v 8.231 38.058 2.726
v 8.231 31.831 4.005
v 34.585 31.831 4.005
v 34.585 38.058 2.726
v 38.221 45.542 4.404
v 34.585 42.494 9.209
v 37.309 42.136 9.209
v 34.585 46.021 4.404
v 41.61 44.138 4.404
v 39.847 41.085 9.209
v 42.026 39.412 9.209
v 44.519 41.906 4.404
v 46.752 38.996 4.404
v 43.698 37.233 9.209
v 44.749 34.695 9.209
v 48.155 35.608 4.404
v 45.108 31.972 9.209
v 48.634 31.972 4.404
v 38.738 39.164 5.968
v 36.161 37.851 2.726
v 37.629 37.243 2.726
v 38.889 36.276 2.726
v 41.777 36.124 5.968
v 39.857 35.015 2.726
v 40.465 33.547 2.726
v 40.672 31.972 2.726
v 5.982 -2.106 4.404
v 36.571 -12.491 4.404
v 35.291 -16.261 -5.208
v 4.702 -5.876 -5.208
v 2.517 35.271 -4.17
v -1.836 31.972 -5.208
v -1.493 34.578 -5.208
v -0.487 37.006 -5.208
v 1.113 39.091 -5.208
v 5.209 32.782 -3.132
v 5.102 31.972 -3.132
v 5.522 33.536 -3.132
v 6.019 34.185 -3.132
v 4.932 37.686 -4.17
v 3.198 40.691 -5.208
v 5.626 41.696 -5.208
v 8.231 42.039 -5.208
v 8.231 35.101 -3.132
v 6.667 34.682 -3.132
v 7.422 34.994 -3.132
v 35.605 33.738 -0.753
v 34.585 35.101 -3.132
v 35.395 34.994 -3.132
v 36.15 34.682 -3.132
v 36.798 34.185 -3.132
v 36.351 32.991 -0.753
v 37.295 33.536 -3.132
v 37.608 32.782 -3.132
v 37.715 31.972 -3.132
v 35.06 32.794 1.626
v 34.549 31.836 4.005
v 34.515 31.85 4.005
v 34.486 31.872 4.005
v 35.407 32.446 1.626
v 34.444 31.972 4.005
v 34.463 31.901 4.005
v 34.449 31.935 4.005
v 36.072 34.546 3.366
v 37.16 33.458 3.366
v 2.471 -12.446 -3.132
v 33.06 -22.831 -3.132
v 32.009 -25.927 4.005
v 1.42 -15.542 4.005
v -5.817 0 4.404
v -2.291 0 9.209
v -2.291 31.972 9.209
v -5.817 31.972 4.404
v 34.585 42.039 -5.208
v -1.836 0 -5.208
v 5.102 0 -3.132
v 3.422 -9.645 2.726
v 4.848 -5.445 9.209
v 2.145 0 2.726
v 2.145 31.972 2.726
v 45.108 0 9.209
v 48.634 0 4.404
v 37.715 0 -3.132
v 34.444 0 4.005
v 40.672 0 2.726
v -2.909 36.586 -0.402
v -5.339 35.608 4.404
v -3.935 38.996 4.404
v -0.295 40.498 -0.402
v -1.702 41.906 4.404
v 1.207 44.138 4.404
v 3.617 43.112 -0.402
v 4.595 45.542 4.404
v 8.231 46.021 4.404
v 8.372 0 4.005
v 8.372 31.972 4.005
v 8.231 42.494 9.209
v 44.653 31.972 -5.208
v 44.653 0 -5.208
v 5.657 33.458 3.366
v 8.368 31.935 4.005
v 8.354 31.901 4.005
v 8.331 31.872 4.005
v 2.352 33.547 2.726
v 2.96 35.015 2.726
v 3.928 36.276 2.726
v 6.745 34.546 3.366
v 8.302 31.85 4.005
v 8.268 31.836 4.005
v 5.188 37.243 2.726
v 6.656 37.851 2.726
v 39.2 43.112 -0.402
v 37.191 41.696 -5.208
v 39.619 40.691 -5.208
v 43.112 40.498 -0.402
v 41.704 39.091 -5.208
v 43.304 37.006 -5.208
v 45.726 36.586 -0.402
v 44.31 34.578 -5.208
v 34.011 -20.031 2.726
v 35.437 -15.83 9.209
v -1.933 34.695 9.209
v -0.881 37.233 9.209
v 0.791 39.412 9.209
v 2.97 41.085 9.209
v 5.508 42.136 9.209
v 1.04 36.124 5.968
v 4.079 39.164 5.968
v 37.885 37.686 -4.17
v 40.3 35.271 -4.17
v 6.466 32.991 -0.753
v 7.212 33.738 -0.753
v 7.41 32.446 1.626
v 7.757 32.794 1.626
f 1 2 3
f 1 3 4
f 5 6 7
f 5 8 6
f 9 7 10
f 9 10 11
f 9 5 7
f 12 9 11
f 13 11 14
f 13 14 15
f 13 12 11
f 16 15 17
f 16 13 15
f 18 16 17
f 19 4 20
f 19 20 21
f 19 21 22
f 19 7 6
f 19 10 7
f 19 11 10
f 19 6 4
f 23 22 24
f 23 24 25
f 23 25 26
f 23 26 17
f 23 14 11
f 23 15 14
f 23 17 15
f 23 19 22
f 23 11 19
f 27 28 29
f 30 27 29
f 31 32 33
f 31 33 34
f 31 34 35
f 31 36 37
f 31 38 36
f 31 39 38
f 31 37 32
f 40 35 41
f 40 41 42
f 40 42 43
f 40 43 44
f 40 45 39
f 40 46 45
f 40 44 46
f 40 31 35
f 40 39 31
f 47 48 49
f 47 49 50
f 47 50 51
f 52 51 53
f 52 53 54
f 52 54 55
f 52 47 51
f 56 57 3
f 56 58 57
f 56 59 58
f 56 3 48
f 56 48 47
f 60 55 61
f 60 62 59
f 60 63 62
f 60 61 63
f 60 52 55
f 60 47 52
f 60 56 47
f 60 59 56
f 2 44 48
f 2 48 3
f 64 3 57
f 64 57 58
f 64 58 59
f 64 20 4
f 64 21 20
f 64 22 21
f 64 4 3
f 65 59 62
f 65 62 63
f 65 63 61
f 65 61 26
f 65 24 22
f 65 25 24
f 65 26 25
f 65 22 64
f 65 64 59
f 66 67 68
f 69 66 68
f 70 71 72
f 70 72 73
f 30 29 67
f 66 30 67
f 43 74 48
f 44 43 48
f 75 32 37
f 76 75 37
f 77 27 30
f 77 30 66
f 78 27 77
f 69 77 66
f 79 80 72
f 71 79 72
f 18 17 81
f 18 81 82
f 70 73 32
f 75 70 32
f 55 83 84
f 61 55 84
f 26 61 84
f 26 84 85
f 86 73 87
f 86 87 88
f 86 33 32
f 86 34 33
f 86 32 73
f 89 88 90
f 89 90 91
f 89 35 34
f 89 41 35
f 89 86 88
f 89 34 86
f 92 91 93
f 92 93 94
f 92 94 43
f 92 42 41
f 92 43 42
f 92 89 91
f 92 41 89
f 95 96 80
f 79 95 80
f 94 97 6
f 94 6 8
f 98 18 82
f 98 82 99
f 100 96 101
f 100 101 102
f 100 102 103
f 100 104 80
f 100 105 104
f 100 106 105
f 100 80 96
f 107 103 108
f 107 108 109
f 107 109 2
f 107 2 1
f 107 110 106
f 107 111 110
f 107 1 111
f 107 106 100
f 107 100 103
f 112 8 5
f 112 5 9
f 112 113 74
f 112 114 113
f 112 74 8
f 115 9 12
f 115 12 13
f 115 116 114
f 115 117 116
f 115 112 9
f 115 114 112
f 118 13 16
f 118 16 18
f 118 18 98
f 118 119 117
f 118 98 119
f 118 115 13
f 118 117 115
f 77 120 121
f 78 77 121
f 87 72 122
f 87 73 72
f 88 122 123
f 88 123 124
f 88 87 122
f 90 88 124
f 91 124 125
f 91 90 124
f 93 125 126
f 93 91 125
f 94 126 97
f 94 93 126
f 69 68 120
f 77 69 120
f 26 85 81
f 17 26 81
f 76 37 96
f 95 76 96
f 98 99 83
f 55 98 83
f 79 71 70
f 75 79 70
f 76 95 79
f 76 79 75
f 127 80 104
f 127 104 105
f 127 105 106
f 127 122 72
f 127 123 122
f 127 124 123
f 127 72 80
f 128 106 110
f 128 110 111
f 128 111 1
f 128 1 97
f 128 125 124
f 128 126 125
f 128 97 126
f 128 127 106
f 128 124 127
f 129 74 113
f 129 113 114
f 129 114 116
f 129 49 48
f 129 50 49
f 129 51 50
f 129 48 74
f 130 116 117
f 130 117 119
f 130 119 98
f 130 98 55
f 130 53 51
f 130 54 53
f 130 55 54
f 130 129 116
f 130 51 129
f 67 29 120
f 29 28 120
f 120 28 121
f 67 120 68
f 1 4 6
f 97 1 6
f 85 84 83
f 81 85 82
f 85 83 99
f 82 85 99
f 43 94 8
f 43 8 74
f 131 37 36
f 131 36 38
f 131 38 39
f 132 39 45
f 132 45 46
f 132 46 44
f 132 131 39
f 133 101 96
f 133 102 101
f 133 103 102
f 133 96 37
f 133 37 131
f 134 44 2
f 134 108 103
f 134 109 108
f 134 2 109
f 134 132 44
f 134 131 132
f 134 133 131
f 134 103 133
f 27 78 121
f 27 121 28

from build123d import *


with BuildPart() as body:
    # AdditivePipe: sweep along a path in Sketch002
    with BuildLine(Plane.XY) as additivepipe_path:
        Line((0, 0), (0, 31.97183))
        ThreePointArc((0, 31.97183), (2.410946, 37.79237), (8.231486, 40.203316))
        Line((8.231486, 40.203316), (34.58542, 40.203316))
        ThreePointArc((34.58542, 40.203316), (40.40596, 37.79237), (42.816906, 31.97183))
        Line((42.816906, 31.97183), (42.816906, 0))
    # Clone2D (on Vertex1 of Sketch002) → AdditivePipe (sweep)
    with BuildSketch(Plane.XZ):
        Polygon((-5.817201, 4.403553), (-1.836139, -5.207869), (5.102284, -3.132028), (8.372442, 4.005447), (2.144924, 2.72582), (-2.291117, 9.209265), align=None)
    sweep(path=additivepipe_path.line)


with BuildPart() as body001:
    # AdditivePipe001: sweep along a path in Sketch003
    with BuildLine(Plane.XY) as additivepipe001_path:
        Line((4.111433, -7.614213), (34.700703, -17.999458))
    # Clone2D001 (on Vertex1 of Sketch003) → AdditivePipe001 (sweep)
    with BuildSketch(Plane(origin=(4.111433, -7.614213, 0), x_dir=(-0.321484, -0.946915, 0), z_dir=(-0.946915, 0.321484, 0))):
        Polygon((-5.817201, 4.403553), (-1.836139, -5.207869), (5.102284, -3.132028), (8.372442, 4.005447), (2.144924, 2.72582), (-2.291117, 9.209265), align=None)
    sweep(path=additivepipe001_path.line)


solid = Compound([body.part, body001.part])
